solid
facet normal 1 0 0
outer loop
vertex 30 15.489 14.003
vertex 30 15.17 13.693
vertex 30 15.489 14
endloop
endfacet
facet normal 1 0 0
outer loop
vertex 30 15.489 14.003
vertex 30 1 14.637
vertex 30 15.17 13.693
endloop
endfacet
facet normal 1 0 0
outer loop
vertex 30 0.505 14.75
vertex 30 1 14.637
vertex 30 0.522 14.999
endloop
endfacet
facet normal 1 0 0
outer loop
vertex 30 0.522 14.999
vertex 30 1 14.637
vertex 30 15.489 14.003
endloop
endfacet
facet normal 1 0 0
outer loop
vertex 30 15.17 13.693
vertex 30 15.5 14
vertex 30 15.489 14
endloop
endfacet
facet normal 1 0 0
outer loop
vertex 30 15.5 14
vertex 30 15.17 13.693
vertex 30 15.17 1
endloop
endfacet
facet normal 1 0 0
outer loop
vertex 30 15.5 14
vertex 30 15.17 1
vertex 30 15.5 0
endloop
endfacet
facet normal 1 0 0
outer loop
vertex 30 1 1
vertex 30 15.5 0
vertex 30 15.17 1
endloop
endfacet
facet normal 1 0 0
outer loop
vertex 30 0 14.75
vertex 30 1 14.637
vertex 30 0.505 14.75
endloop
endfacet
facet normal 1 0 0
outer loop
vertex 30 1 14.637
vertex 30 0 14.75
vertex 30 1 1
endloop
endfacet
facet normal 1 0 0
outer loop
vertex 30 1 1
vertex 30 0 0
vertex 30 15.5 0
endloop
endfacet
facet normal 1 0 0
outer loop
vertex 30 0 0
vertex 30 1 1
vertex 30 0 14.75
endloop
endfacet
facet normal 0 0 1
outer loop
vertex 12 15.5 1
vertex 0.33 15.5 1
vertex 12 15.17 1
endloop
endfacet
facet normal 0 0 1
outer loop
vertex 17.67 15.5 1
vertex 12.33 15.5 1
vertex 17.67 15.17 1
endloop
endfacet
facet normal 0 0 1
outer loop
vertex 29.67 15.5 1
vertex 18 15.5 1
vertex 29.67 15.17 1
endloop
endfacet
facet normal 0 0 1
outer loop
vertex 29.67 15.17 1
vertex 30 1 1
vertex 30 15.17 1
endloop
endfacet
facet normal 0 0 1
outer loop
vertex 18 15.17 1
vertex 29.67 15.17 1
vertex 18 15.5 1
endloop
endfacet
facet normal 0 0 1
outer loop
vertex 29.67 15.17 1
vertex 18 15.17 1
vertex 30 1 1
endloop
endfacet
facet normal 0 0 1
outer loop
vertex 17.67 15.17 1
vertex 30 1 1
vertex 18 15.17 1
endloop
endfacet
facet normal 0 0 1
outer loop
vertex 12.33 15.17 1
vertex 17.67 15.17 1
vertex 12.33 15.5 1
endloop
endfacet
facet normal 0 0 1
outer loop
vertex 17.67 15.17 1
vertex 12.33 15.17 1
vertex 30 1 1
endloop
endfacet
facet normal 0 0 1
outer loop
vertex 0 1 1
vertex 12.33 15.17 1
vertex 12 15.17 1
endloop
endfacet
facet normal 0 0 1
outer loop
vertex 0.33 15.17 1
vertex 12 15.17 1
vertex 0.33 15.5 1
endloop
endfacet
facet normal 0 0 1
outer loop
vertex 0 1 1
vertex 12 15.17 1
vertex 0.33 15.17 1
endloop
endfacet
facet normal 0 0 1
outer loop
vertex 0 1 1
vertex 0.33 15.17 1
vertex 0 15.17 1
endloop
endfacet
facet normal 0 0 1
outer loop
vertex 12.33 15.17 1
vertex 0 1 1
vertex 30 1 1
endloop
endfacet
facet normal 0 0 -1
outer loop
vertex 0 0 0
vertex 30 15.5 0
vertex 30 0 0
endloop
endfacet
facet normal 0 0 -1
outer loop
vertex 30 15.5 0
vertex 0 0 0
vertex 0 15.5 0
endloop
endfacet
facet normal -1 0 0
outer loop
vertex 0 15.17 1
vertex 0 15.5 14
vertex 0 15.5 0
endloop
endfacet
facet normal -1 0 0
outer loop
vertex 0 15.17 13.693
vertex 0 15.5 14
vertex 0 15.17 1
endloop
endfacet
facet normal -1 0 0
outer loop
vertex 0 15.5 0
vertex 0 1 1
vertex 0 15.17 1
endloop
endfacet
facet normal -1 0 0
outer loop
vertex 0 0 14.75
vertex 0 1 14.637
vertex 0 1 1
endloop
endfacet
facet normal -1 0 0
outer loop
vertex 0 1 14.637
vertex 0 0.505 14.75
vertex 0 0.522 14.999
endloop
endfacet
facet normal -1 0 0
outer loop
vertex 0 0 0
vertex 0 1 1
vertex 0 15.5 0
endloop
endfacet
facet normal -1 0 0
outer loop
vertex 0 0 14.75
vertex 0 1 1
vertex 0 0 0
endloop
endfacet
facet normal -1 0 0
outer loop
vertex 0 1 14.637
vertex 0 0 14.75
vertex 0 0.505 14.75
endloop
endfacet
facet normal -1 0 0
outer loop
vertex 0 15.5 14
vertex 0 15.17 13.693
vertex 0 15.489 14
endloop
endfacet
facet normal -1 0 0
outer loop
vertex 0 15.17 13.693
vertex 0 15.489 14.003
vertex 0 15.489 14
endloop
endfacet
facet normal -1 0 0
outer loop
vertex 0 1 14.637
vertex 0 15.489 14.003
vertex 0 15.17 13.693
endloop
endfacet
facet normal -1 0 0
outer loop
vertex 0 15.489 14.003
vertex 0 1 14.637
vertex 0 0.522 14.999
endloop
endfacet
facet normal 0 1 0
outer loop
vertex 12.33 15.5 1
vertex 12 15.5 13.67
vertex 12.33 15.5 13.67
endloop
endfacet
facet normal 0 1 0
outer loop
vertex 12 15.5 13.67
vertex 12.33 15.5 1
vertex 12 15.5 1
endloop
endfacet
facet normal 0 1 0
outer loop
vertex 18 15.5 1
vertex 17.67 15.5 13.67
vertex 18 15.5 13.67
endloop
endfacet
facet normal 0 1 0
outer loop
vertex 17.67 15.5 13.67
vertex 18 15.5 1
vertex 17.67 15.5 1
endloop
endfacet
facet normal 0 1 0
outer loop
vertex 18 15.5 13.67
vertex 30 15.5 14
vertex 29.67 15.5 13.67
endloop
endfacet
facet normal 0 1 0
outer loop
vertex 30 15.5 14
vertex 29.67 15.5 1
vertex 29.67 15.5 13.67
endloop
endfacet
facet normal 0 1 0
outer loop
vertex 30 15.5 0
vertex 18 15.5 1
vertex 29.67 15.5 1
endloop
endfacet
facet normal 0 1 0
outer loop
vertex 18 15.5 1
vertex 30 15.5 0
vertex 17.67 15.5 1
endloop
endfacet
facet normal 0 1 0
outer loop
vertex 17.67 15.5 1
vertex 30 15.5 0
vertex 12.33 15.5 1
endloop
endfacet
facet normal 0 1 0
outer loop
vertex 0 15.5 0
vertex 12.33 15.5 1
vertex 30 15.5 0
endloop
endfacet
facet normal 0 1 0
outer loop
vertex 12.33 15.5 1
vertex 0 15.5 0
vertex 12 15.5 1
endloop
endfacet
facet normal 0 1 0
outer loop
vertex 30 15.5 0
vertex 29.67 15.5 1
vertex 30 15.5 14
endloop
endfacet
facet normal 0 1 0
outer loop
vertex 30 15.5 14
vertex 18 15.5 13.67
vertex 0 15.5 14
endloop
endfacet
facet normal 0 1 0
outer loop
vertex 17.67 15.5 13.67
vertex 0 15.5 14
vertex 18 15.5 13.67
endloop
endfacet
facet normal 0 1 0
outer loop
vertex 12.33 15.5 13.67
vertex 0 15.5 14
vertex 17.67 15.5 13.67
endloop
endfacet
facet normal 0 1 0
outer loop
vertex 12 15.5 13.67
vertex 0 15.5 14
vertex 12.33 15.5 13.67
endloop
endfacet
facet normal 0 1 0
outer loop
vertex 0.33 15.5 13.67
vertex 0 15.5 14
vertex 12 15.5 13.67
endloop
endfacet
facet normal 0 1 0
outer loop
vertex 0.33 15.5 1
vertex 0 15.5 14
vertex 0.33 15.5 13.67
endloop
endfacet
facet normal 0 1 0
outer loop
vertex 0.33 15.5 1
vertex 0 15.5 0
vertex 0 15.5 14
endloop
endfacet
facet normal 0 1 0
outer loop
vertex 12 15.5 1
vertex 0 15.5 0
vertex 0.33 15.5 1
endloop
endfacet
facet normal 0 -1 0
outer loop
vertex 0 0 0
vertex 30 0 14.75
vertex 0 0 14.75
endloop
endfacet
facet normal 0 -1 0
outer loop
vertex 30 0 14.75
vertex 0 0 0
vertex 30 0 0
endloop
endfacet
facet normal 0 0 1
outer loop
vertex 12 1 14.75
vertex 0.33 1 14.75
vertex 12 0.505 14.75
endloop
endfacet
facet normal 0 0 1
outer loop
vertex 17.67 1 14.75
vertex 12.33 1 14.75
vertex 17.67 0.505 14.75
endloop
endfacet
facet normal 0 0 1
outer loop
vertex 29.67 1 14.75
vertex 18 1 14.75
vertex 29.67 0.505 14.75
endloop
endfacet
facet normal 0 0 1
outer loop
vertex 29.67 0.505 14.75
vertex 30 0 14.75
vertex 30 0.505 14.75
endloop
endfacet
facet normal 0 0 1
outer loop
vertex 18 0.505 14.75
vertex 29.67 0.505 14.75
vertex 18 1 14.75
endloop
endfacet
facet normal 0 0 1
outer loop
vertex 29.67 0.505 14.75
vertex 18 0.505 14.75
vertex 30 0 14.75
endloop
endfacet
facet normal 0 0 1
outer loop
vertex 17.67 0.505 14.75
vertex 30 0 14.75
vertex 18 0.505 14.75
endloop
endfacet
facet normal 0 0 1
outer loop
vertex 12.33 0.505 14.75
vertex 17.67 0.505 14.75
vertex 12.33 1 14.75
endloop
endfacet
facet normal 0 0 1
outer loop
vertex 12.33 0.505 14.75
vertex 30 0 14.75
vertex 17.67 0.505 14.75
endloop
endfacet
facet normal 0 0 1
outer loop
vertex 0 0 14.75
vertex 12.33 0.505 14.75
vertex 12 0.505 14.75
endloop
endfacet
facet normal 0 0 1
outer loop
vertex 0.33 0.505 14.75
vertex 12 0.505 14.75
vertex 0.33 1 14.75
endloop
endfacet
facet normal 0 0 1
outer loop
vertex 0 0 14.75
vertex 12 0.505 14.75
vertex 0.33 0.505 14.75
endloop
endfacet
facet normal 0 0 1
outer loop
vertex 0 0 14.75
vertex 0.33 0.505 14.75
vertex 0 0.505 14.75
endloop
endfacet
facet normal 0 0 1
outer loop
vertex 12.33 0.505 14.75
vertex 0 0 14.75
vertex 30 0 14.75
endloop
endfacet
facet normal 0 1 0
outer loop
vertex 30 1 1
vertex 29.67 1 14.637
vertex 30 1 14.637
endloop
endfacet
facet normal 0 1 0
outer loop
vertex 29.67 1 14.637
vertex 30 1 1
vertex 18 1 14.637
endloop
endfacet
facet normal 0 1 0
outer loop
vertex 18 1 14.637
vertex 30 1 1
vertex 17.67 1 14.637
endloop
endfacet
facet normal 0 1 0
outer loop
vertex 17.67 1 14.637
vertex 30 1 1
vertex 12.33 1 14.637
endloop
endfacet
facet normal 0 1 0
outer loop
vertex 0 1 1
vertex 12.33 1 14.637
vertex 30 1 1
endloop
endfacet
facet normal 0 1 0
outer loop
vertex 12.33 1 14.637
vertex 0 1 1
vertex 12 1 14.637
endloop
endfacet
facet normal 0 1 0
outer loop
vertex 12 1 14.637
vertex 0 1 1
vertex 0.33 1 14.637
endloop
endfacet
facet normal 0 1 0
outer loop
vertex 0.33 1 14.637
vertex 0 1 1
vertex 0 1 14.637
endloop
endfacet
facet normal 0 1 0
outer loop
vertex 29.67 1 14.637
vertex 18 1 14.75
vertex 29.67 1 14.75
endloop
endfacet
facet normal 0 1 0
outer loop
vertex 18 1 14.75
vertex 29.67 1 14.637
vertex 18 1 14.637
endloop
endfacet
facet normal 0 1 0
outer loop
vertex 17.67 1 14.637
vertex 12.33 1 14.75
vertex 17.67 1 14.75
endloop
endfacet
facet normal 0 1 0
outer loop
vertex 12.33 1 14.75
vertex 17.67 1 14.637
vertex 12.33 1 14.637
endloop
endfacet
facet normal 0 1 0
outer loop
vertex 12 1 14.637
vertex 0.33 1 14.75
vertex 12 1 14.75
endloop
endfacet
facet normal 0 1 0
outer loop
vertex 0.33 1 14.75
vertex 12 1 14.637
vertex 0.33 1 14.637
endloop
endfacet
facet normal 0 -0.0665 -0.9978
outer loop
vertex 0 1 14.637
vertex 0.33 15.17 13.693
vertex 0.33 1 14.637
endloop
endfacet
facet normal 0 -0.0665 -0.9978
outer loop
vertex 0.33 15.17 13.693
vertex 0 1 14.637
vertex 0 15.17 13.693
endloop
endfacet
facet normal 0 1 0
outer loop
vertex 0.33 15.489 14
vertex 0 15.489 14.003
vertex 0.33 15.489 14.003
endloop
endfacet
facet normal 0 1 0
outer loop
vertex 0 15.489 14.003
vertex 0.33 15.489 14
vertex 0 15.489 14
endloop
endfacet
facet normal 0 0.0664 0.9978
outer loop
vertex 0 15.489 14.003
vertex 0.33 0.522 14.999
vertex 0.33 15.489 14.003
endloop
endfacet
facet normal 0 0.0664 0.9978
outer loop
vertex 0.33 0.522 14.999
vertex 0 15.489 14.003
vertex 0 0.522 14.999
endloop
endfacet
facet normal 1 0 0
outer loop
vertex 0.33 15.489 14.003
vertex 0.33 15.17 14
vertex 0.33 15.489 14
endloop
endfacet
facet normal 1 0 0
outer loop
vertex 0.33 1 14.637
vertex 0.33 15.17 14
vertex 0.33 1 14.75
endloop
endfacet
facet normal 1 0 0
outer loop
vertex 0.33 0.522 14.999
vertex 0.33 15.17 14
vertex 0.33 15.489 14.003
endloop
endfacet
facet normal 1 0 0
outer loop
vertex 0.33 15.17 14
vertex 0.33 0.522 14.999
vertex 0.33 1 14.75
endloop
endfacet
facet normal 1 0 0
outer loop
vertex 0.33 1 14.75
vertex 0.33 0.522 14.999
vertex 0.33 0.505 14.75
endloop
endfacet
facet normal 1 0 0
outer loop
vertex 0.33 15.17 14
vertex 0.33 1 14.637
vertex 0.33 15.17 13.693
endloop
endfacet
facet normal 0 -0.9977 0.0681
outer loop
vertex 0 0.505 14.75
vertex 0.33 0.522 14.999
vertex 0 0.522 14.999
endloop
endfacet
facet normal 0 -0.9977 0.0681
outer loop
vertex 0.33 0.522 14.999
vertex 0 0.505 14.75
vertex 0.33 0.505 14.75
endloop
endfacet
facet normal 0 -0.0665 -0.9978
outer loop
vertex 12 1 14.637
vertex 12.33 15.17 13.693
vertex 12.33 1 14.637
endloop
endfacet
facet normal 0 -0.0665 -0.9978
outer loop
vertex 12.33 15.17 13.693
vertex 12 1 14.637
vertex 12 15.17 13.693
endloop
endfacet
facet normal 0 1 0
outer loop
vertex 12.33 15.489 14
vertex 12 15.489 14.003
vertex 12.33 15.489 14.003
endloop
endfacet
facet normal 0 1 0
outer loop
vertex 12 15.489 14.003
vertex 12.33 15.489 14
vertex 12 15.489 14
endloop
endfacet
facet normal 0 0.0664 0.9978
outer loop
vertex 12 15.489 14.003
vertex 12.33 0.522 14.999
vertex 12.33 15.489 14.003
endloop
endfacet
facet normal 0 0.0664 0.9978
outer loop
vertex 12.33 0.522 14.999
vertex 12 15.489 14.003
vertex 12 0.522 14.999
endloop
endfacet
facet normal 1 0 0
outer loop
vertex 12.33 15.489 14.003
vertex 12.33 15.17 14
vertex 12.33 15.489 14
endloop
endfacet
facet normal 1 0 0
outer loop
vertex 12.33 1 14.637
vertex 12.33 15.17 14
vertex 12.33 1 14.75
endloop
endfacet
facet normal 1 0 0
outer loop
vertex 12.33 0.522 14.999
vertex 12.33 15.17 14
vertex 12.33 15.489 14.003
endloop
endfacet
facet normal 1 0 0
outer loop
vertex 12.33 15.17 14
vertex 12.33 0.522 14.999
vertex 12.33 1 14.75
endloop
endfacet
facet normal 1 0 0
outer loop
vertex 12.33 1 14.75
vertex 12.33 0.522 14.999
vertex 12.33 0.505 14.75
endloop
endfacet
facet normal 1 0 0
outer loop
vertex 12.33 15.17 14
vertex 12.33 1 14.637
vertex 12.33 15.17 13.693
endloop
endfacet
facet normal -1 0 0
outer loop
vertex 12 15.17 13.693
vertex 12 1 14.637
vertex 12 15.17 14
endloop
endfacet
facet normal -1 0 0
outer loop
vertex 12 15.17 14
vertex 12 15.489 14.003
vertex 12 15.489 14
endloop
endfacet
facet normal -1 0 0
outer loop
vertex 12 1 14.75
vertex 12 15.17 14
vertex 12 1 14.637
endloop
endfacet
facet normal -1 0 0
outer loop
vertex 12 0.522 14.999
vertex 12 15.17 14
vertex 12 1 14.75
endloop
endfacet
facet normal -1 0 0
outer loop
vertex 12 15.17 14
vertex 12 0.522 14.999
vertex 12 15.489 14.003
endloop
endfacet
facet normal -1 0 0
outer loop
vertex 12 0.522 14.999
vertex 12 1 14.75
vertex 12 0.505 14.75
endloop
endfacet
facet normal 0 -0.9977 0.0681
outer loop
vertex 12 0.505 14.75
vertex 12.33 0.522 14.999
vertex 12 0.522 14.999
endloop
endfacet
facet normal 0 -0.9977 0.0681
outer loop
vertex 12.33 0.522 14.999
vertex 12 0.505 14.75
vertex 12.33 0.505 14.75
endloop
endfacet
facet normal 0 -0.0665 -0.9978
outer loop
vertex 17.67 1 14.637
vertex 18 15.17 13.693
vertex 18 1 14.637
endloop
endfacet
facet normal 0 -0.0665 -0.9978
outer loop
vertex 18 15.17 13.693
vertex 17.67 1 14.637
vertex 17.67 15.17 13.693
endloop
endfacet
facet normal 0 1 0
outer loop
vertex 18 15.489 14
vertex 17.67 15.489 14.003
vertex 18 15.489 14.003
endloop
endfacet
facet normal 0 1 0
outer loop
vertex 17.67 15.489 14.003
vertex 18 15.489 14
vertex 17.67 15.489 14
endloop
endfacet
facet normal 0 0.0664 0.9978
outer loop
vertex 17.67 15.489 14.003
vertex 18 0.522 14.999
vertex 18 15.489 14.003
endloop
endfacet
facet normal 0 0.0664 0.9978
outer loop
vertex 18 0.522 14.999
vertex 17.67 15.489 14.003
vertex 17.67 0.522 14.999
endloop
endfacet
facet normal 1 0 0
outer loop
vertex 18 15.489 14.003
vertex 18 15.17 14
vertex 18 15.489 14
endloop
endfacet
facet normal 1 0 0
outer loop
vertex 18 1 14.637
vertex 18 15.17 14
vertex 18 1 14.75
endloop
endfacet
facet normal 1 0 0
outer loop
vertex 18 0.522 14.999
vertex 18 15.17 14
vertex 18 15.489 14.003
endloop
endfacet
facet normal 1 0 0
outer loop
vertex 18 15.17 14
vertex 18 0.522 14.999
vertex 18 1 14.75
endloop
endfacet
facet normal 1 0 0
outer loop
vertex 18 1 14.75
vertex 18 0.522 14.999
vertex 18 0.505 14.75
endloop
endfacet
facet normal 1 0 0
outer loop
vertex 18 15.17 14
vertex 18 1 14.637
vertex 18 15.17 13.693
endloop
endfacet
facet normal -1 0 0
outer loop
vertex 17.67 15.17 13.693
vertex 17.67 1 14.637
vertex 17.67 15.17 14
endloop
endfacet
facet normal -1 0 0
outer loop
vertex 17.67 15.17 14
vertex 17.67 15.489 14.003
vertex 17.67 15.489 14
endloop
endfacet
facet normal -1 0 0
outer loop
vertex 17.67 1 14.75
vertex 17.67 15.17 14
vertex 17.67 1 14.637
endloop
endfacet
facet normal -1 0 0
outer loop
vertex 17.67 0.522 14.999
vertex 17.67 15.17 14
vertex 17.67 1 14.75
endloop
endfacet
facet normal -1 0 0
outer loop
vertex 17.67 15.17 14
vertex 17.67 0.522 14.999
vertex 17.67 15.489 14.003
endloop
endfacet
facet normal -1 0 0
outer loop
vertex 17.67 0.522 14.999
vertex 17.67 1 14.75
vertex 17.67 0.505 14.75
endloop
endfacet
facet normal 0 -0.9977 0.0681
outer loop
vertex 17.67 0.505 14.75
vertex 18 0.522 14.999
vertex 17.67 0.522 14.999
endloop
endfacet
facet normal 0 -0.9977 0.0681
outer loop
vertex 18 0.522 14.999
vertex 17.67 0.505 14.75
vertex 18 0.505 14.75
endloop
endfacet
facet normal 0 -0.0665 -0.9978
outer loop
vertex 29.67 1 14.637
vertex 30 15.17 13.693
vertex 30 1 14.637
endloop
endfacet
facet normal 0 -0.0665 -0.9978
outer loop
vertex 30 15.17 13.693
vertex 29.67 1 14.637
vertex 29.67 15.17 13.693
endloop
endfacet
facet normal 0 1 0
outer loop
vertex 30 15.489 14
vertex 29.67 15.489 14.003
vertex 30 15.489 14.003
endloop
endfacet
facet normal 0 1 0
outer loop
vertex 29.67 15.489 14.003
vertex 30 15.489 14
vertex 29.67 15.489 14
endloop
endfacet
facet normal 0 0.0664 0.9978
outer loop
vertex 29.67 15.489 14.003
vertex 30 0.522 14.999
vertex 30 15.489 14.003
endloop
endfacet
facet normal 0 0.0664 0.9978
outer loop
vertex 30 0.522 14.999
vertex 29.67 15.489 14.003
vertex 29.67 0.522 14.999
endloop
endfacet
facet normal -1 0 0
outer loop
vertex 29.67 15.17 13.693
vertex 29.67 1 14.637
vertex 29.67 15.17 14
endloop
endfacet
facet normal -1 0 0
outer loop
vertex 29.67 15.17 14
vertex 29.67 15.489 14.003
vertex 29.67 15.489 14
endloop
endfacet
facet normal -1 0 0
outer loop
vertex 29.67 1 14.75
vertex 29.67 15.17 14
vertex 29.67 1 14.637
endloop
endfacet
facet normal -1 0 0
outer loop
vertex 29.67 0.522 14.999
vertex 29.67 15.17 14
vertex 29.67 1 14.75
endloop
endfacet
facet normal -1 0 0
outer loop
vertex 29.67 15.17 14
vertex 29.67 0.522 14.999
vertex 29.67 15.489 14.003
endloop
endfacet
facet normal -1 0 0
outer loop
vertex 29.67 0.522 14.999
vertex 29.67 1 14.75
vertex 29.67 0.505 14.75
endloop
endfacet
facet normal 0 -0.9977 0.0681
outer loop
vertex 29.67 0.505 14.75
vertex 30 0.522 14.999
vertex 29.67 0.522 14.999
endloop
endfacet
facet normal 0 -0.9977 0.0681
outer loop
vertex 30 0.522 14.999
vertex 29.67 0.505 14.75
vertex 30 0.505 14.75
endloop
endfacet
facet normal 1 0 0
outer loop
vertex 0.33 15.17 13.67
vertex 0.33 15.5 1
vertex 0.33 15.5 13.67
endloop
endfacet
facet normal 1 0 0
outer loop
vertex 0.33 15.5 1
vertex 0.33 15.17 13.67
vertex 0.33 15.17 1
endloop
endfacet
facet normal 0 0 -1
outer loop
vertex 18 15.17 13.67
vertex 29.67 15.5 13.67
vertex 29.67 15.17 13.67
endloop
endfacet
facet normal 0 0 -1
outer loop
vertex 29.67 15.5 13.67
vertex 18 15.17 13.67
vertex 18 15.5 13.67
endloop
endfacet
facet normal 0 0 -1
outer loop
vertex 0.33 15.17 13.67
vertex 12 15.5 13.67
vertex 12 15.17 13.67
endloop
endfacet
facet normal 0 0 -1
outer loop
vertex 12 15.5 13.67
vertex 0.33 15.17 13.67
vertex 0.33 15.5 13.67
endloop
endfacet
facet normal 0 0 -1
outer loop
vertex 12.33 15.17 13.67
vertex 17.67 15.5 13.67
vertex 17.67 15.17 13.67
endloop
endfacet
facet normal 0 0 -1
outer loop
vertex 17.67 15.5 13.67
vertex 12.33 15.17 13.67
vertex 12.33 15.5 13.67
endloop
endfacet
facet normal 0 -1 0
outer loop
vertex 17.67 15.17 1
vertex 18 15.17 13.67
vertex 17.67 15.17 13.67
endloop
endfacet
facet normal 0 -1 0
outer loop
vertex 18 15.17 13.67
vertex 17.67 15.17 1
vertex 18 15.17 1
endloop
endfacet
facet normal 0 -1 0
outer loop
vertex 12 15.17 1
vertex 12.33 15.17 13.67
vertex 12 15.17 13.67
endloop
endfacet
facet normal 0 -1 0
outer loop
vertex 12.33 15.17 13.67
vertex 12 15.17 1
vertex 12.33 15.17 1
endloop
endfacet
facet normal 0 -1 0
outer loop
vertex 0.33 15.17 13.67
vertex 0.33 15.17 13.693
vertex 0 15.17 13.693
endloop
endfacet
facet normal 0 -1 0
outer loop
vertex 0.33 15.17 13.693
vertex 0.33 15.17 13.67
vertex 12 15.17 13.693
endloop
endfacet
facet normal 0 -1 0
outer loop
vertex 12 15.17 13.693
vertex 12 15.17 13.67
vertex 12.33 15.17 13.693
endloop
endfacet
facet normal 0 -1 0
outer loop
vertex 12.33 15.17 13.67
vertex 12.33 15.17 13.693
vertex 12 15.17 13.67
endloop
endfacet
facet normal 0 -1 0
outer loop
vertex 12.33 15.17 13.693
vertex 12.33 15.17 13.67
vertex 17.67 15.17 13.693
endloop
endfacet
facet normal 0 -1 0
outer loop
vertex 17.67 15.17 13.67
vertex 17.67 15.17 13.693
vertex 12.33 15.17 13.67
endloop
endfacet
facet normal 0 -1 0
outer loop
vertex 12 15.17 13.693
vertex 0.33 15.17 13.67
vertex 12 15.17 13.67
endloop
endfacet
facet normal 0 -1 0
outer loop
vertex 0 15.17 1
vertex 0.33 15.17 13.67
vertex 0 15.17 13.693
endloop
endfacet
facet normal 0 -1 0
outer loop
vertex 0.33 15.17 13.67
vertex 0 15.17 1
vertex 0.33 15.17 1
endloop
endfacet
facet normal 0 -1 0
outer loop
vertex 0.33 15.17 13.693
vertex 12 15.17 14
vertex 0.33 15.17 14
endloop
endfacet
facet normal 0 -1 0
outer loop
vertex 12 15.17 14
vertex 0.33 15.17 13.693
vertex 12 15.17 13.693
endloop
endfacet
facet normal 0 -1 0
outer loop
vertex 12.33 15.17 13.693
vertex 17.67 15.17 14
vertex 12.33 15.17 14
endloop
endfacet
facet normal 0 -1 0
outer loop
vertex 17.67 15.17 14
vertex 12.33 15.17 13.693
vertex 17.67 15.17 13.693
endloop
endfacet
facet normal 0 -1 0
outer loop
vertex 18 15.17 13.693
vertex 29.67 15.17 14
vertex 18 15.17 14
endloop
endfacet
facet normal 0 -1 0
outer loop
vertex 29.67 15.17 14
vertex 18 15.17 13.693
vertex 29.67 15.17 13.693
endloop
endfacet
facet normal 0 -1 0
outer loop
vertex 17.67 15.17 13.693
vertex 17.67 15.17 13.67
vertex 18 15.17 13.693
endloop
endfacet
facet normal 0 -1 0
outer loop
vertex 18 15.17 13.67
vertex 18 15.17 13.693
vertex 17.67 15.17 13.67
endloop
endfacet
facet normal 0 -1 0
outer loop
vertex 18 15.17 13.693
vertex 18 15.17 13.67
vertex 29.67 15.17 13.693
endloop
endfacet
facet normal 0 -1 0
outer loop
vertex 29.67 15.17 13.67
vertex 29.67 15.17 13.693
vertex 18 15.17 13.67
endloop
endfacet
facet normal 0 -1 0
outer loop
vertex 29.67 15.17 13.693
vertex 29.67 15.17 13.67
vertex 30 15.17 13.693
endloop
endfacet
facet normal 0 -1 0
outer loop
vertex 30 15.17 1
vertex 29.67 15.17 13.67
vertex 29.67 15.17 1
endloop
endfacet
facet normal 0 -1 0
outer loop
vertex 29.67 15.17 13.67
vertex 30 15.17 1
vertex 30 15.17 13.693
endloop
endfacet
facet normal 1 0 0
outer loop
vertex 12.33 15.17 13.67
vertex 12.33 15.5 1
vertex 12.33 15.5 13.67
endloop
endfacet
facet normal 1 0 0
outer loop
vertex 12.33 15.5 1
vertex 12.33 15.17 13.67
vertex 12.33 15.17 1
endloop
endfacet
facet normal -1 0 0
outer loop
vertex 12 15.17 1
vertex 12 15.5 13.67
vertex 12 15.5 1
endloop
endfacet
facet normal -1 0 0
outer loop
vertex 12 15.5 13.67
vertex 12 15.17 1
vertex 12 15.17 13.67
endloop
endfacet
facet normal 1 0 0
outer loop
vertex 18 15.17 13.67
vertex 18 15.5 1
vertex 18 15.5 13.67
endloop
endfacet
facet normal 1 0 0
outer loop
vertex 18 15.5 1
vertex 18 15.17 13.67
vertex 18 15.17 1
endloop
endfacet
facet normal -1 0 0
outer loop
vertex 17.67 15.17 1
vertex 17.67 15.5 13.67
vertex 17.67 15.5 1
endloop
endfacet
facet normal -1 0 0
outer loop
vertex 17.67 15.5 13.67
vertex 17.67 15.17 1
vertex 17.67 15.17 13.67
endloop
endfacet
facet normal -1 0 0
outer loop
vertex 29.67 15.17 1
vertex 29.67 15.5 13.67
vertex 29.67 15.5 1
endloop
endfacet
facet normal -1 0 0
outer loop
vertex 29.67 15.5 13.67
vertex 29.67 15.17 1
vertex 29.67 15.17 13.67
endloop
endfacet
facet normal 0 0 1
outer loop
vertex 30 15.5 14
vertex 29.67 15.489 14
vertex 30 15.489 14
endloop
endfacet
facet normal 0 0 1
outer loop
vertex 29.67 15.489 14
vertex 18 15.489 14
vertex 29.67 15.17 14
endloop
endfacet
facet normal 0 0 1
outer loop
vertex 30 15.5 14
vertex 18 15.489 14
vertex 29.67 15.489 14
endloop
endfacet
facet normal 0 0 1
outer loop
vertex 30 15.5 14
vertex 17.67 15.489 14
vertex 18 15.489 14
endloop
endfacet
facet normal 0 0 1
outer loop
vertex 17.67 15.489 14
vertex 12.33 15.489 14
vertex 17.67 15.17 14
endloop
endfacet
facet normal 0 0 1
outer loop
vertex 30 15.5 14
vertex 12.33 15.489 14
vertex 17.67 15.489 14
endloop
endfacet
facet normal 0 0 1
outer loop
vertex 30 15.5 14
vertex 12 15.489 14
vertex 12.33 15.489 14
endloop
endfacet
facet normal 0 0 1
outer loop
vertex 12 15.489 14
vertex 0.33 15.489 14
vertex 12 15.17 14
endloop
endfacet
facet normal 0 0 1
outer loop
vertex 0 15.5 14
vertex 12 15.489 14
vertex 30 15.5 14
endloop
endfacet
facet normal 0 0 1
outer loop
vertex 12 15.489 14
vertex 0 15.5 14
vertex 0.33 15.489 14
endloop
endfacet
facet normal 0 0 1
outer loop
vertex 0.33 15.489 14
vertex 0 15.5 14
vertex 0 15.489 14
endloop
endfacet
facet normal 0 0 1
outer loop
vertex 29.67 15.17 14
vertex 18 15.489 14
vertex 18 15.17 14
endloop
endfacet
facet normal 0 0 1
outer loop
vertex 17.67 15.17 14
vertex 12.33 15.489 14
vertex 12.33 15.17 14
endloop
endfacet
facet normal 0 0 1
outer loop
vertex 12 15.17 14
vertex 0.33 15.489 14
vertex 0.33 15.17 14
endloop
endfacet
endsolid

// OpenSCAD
color("white", 0.4) {
    cube([30, 15.5, 1]);
    cube([30, 1, 14.75]);
}

color("black") {
    translate([0, 0.5, 14-0.33+1]) rotate([-3.81, 0, 0]) cube([0.33, 15, 0.33]);
    translate([12, 0.5, 14-0.33+1]) rotate([-3.81, 0, 0]) cube([0.33, 15, 0.33]);
    translate([18-0.33, 0.5, 14-0.33+1]) rotate([-3.81, 0, 0]) cube([0.33, 15, 0.33]);
    translate([30-0.33, 0.5, 14-0.33+1]) rotate([-3.81, 0, 0]) cube([0.33, 15, 0.33]);
    
    translate([0, 15.5 - 0.33, 1]) cube([0.33, 0.33, 13-0.33]);
    translate([12, 15.5 - 0.33, 1]) cube([0.33, 0.33, 13-0.33]);
    translate([18-0.33, 15.5 - 0.33, 1]) cube([0.33, 0.33, 13-0.33]);
    translate([30-0.33, 15.5 - 0.33, 1]) cube([0.33, 0.33, 13-0.33]);
    
    translate([0, 15.5 - 0.33, 14-0.33]) cube([30, 0.33, 0.33]);
}
